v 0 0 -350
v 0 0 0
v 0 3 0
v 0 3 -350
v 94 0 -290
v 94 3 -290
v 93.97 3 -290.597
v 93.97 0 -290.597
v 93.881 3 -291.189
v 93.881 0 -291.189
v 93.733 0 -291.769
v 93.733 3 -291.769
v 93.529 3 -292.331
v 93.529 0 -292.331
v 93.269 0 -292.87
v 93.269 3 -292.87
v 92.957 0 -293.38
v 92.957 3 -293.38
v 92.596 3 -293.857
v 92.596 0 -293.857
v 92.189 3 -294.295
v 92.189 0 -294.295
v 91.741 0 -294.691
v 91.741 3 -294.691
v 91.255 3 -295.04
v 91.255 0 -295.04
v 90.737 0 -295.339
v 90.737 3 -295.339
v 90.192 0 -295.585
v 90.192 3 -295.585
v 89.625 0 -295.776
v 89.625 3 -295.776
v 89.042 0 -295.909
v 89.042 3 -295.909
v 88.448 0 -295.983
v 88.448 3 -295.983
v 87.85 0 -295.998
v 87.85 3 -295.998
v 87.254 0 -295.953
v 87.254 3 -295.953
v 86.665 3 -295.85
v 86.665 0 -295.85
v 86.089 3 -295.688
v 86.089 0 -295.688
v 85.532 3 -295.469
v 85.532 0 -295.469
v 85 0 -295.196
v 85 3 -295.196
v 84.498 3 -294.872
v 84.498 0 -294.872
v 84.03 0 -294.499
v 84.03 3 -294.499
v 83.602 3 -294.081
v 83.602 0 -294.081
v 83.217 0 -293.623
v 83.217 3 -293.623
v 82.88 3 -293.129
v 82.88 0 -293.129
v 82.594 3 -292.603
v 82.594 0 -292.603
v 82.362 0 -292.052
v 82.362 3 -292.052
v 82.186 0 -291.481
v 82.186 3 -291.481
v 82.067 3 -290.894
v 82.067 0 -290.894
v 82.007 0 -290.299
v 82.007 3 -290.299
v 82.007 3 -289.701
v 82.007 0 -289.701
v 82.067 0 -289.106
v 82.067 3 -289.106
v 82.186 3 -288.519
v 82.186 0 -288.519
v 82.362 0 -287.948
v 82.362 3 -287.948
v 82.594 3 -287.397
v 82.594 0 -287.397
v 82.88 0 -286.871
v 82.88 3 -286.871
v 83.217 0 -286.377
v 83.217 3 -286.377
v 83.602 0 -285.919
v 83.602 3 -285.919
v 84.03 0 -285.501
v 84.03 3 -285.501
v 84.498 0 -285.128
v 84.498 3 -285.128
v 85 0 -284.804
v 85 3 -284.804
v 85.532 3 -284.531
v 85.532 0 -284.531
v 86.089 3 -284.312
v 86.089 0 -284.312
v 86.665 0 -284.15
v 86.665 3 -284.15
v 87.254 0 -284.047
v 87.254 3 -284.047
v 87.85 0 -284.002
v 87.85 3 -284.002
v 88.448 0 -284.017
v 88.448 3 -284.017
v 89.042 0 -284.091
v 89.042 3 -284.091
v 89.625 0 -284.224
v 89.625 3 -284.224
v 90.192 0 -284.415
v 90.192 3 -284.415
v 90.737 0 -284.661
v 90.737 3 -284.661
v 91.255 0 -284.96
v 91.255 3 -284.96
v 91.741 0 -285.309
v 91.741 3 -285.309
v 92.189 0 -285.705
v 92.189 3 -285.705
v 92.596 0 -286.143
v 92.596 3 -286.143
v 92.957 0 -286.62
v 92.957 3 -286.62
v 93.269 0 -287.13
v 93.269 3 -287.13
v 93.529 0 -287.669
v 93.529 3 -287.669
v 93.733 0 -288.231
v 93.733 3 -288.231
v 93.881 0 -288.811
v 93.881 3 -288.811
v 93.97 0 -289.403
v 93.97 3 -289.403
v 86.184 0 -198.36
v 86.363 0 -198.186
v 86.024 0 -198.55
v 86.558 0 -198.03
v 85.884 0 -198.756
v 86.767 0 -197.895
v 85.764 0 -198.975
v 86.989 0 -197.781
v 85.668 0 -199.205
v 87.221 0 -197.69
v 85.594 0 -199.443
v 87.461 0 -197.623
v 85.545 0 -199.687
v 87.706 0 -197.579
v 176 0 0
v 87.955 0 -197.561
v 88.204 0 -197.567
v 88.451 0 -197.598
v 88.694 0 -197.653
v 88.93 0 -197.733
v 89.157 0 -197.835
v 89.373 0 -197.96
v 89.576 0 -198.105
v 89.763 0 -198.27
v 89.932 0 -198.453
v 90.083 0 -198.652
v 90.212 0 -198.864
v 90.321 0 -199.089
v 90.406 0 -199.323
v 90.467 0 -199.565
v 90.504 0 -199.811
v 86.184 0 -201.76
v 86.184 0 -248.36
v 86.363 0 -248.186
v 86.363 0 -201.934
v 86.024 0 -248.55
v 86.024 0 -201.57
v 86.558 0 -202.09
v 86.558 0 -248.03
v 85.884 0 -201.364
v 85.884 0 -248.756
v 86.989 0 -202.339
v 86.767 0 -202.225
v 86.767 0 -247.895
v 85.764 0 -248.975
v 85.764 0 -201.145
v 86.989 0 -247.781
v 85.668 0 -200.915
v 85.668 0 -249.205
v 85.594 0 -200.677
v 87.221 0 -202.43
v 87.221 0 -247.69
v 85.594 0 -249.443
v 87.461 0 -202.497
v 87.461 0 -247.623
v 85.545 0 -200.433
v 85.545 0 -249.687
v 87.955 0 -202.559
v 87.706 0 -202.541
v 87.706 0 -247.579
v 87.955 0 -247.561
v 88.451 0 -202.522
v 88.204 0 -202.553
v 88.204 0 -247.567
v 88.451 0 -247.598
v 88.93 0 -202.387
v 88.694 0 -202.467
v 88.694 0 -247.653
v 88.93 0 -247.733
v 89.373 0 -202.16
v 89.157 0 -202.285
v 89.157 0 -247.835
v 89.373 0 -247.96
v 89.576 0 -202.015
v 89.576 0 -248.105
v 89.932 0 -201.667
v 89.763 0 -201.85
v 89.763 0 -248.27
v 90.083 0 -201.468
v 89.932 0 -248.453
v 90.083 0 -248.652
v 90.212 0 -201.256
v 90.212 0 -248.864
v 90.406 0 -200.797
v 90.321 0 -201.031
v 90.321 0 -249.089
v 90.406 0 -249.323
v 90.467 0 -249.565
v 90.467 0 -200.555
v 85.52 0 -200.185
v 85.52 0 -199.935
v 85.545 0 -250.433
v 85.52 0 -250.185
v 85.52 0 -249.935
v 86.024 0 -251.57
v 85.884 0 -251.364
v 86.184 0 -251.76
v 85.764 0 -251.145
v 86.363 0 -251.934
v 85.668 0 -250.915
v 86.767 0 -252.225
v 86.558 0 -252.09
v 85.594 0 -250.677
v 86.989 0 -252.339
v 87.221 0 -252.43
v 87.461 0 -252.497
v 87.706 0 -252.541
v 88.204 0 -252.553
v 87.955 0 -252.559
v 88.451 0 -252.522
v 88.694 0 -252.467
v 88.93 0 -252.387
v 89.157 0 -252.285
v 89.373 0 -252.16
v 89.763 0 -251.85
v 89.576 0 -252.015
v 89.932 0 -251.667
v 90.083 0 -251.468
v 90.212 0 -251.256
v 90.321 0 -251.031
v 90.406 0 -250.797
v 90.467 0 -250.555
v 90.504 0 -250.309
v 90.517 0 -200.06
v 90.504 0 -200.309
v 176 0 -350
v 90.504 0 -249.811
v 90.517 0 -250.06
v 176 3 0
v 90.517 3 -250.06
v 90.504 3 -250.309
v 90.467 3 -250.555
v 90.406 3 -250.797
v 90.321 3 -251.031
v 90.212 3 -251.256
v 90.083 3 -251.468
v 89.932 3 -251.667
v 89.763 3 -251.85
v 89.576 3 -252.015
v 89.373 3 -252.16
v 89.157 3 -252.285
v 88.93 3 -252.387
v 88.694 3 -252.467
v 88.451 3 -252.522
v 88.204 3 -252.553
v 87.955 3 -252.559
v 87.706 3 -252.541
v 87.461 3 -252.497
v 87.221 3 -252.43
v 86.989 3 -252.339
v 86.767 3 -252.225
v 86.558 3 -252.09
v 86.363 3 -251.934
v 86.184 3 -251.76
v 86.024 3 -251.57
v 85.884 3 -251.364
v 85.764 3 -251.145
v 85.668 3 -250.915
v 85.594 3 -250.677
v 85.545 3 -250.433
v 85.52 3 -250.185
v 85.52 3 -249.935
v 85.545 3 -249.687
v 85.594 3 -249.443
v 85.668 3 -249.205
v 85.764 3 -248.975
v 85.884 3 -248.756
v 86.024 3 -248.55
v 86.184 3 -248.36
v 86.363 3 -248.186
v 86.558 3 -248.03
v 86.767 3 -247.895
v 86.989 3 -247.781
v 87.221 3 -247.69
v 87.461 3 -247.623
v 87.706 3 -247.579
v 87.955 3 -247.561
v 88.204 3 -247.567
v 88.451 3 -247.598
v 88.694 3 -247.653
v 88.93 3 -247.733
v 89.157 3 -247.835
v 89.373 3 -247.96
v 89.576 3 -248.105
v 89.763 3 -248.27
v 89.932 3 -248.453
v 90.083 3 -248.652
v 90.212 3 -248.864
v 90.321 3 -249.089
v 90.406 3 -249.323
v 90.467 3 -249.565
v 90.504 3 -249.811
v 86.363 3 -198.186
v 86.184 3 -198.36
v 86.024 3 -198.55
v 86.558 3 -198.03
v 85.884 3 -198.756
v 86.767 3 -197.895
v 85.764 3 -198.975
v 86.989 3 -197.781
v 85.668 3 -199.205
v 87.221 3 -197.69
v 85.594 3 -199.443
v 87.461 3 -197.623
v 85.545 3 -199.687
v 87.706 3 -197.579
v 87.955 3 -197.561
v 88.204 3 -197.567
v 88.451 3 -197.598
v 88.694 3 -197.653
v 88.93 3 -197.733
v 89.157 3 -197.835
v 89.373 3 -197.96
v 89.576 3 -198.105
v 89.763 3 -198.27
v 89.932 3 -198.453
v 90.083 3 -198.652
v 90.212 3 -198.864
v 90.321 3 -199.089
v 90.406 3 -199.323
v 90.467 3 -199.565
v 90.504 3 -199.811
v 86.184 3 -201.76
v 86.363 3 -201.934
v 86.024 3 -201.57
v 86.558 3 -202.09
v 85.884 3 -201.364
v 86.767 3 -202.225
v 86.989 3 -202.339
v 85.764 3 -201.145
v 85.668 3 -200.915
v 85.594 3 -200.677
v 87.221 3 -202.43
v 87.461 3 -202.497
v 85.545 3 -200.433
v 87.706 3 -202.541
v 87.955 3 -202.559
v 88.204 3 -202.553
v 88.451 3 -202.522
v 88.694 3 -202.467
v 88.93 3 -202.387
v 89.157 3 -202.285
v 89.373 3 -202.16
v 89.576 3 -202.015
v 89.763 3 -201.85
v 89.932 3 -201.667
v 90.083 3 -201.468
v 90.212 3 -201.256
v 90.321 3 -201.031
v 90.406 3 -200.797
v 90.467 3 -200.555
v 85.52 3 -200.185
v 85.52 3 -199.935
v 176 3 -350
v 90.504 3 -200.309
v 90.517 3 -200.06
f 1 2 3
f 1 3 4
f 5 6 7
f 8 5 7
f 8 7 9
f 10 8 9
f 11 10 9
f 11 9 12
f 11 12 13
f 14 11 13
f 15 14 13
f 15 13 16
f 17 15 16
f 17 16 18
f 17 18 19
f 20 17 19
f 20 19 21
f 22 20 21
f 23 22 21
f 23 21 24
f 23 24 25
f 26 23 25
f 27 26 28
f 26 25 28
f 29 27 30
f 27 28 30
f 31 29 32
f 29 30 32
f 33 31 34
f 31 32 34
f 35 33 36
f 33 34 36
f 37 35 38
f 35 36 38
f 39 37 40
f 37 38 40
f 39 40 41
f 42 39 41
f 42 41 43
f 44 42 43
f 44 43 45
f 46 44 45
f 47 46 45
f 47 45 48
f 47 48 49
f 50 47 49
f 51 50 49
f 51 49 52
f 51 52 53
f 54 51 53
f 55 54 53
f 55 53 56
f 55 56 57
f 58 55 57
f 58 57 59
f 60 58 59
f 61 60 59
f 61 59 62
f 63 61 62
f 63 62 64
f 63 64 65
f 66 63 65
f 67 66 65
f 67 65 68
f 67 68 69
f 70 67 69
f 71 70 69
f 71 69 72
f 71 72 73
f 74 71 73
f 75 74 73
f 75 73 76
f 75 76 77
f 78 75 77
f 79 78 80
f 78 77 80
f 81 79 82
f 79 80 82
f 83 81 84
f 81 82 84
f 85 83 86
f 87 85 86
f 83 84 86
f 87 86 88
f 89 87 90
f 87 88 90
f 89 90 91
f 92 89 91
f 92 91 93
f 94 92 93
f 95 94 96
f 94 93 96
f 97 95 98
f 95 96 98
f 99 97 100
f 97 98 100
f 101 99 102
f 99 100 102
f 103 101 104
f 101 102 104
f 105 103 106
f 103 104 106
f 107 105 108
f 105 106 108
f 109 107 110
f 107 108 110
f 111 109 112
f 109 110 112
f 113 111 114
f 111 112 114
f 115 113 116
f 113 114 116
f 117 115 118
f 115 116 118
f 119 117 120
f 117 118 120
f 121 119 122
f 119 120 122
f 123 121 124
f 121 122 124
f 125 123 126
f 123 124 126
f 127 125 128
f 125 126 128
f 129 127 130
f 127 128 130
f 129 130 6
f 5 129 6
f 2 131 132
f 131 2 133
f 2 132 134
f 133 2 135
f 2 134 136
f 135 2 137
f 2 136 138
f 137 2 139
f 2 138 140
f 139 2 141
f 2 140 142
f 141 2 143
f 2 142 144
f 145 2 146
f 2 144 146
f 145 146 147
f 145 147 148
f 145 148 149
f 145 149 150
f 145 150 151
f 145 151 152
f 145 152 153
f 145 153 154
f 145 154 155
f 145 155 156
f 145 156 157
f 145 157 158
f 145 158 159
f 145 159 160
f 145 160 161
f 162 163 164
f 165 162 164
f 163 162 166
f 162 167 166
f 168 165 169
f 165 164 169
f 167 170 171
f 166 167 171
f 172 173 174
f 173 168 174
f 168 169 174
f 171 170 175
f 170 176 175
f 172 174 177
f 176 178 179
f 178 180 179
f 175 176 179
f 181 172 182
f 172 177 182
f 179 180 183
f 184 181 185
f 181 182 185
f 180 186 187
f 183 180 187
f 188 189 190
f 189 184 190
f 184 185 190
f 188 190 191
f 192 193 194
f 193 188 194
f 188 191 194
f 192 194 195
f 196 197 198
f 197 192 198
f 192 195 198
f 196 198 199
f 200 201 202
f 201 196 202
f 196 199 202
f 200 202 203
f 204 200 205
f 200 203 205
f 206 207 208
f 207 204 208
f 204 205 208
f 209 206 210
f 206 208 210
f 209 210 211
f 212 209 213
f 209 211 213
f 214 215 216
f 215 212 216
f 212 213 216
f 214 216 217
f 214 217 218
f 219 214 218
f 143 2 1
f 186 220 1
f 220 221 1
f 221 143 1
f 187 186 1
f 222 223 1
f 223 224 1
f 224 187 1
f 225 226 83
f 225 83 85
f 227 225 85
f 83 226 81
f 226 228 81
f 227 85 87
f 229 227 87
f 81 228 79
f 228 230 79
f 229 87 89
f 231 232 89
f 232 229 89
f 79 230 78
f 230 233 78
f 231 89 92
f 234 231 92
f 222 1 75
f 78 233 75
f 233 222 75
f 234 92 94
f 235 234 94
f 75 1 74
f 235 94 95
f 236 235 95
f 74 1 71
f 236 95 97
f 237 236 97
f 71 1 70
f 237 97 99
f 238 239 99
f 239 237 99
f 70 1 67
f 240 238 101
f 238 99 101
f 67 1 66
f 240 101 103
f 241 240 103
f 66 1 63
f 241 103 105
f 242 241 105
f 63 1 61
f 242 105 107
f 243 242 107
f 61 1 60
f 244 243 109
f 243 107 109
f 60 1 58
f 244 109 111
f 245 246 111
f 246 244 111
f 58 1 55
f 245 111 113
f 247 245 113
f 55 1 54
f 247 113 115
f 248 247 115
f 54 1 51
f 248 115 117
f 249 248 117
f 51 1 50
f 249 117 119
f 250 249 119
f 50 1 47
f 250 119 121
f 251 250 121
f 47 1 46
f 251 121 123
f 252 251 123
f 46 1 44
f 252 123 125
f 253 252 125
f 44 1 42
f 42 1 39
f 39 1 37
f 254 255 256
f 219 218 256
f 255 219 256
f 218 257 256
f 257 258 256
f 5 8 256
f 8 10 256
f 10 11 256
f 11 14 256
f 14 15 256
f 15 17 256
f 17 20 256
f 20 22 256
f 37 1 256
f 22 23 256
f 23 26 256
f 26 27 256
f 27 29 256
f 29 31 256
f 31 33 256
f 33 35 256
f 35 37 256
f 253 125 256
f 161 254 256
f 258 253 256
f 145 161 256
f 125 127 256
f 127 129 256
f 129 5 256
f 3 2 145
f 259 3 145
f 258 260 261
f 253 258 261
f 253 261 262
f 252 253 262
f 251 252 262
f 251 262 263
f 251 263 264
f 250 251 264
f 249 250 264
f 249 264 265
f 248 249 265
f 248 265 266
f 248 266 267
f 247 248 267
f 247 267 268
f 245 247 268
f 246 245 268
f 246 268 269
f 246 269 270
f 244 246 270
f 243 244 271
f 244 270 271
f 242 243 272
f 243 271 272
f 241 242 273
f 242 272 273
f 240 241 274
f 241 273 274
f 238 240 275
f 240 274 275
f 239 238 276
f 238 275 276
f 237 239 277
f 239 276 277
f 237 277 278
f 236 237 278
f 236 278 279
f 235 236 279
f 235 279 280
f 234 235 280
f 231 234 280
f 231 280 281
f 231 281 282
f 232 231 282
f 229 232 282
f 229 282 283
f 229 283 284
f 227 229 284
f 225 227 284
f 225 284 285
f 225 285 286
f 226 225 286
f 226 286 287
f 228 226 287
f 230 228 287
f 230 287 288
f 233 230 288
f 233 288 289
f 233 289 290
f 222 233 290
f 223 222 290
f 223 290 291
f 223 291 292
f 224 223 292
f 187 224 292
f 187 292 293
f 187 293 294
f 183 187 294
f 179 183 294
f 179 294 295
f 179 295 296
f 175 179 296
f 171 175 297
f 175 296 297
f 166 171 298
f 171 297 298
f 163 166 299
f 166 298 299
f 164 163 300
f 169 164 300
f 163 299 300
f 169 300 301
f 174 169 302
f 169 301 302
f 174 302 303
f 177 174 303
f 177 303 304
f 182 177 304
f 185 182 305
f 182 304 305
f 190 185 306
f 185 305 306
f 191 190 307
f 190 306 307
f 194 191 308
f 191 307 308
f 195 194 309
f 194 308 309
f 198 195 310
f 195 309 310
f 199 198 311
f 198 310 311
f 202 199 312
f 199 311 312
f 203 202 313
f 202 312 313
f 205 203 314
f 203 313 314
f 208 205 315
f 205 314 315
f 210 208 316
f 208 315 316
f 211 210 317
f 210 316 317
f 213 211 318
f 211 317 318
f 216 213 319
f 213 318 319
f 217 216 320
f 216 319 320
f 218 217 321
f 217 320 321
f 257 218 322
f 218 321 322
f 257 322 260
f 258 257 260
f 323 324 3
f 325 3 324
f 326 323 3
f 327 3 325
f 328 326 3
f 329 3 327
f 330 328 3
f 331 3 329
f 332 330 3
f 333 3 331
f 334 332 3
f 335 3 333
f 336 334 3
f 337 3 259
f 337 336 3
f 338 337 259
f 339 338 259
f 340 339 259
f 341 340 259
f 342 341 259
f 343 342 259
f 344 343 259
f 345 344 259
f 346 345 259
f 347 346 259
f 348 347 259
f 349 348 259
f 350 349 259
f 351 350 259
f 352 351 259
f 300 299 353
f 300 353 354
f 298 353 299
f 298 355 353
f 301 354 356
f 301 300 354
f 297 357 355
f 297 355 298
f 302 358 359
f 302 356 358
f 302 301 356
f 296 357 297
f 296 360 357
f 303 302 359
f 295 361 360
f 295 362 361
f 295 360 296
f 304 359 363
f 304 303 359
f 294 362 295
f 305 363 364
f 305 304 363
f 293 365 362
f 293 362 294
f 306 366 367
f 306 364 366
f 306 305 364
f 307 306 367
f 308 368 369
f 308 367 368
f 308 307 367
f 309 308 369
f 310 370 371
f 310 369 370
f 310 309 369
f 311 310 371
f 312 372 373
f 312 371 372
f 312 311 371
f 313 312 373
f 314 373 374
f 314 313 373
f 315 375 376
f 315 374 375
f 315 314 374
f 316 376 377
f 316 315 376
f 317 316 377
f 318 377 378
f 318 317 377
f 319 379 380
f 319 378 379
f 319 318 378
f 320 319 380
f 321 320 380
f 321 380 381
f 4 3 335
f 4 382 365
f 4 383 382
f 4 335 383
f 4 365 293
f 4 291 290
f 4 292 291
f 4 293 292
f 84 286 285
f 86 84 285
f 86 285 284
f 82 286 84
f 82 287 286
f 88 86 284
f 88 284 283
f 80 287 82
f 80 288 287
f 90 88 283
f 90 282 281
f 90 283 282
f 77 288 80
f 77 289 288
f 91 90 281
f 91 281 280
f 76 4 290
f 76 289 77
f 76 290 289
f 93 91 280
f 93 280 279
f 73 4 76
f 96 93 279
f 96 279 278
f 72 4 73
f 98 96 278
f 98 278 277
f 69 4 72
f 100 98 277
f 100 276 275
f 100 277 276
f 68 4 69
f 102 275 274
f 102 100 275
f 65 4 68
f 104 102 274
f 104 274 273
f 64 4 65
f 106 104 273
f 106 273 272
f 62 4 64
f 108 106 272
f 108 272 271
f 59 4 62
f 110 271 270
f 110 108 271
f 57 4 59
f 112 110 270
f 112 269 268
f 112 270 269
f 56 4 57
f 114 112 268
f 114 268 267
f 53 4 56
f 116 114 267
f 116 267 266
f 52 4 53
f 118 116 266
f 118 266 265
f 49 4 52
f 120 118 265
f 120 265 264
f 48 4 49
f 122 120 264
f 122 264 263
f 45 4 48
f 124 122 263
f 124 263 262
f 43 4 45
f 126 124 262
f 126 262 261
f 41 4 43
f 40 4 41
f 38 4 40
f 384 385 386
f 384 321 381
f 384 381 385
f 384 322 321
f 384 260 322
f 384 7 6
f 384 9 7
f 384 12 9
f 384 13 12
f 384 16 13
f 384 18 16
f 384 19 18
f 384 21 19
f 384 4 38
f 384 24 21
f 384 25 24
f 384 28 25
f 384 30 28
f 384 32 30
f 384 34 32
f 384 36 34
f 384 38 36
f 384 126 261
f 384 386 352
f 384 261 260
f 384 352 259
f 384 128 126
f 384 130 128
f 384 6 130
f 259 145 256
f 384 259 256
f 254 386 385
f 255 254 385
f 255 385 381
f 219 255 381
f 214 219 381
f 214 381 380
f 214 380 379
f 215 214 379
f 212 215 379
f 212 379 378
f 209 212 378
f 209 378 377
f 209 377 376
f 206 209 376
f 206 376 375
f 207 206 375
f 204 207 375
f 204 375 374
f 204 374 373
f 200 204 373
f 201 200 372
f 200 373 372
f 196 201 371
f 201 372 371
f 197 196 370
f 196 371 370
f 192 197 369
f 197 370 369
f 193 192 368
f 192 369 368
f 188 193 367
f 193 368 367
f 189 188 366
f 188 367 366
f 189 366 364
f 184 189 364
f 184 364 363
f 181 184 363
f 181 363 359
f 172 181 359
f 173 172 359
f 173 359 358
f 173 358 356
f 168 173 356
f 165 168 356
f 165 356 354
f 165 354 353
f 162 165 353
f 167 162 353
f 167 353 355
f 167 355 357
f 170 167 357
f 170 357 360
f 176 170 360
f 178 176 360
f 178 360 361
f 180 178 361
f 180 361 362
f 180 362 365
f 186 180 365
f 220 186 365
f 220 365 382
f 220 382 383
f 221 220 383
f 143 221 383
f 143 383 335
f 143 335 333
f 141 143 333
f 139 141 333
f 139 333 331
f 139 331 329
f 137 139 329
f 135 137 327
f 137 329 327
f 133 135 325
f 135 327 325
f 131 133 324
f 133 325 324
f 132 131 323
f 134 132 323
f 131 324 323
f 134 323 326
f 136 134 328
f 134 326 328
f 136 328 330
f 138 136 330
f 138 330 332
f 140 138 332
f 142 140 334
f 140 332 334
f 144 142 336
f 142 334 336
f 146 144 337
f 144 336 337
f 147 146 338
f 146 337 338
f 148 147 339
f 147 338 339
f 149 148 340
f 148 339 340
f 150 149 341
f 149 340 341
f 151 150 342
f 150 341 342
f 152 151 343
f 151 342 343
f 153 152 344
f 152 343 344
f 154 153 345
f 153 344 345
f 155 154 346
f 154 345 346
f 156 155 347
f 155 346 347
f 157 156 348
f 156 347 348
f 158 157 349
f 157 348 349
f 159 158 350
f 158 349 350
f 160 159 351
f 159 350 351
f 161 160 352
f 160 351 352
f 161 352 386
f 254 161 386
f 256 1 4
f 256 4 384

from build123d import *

# Parameters (mm, degrees)
SKETCH1_W              = 176
SKETCH1_H              = 350
BOSS_EXTRUDE1_DEPTH    = 3
F_5_0MM_DOWEL_HOLE1_D  = 5
F_12_0MM_DOWEL_HOLE1_D = 12


with BuildPart() as part:
    # Sketch1 → Boss-Extrude1 (new body)
    with BuildSketch(Plane(origin=(0, 0, 0), x_dir=(1, 0, 0), z_dir=(0, 1, 0))):
        with Locations((88, 175)):
            Rectangle(SKETCH1_W, SKETCH1_H)
    extrude(amount=BOSS_EXTRUDE1_DEPTH)

    # Ø5.0mm Dowel Hole1 (through all)
    with Locations(Plane(origin=(0, 0, 0), x_dir=(-1, 0, 0), z_dir=(0, -1, 0))):
        with Locations((-88.016913139, 250.06), (-88.016913139, 200.06)):
            Hole(F_5_0MM_DOWEL_HOLE1_D / 2)

    # Ø12.0mm Dowel Hole1 (through all)
    with Locations(Plane(origin=(0, 0, 0), x_dir=(-1, 0, 0), z_dir=(0, -1, 0))):
        with Locations((-88, 290)):
            Hole(F_12_0MM_DOWEL_HOLE1_D / 2)


solid = part.part
